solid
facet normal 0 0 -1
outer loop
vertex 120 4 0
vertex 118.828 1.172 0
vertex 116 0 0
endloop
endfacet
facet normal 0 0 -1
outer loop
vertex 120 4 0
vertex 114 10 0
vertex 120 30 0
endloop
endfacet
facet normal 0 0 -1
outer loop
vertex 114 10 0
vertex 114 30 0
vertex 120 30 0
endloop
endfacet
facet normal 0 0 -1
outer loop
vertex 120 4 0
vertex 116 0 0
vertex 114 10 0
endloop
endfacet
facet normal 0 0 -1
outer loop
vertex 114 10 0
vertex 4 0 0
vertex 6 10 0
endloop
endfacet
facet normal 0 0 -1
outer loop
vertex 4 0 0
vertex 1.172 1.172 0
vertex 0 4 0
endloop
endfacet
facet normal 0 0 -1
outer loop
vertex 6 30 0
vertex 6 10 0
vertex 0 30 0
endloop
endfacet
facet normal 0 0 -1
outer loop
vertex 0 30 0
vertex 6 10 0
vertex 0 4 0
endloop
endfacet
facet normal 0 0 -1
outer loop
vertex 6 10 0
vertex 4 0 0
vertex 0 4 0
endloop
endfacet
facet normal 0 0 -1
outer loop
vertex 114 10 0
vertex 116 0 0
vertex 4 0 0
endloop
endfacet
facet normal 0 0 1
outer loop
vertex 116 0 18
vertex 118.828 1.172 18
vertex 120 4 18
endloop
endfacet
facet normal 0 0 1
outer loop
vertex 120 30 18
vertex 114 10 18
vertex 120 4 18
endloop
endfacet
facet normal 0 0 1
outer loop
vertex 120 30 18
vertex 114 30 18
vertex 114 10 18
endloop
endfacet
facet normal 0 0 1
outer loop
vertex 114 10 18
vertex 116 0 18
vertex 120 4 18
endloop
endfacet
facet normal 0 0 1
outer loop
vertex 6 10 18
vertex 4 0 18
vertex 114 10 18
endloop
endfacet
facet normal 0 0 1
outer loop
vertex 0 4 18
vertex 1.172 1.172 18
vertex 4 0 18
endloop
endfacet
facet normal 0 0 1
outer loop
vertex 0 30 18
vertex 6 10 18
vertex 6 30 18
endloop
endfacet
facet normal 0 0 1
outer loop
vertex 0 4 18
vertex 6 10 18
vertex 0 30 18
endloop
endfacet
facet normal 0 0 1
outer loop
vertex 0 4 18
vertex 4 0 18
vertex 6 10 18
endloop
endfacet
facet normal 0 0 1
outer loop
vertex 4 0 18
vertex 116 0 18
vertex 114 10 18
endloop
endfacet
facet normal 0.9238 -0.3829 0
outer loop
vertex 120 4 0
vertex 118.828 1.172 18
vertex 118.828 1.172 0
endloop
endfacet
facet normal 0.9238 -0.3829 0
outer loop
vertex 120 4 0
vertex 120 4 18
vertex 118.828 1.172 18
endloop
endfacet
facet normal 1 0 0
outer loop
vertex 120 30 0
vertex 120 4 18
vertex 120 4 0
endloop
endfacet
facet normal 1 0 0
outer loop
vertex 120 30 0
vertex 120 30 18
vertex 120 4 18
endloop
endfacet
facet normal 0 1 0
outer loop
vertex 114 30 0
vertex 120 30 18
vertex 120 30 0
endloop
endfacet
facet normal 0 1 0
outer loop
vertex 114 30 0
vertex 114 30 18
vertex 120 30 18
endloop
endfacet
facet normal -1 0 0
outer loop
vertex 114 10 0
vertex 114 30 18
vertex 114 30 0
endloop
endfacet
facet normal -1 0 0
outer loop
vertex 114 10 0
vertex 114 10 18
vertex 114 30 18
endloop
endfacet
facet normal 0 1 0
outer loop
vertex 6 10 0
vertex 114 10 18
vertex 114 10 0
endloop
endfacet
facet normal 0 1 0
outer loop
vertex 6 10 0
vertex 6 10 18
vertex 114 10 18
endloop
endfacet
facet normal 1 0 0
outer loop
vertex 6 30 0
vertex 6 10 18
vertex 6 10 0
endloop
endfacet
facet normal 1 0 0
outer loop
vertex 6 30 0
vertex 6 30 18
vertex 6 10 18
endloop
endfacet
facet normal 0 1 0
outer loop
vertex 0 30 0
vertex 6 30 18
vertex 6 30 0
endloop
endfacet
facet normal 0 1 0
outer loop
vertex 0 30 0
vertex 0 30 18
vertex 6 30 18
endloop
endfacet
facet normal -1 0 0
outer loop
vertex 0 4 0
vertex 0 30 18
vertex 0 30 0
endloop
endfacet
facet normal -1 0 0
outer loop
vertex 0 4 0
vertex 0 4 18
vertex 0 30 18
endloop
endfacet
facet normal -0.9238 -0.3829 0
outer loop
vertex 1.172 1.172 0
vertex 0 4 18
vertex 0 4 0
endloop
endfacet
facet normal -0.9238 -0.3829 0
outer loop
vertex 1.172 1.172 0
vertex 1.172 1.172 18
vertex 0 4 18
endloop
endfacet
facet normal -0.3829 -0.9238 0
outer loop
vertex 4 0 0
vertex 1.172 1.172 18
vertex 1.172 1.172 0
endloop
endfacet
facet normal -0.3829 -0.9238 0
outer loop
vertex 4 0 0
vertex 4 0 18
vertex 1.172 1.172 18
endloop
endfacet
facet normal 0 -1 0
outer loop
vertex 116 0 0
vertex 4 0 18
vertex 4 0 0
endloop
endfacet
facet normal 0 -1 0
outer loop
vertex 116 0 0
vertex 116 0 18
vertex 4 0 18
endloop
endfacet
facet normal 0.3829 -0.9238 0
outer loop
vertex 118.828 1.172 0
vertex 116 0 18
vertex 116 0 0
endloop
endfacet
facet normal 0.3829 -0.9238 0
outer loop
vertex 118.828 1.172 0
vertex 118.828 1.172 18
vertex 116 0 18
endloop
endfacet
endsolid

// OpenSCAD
$fn = 32;

// ----------------------------------------------------------------------
// Heat sink frame: 120 x 30 mm frame, 6 mm walls
// ----------------------------------------------------------------------

// --- parameters (mm) ---
profile_height = 18;      // extrusion height
profile_points = 12;      // points of the closed outline

profile = [[0, 4], [1.172, 1.172], [4, 0], [116, 0], [118.828, 1.172], [120, 4], [120, 30], [114, 30], [114, 10], [6, 10], [6, 30], [0, 30]];  // single closed polygon, 12 points, counter clockwise

// --- the one profile operation ---
linear_extrude(height = profile_height) polygon(points = profile);
